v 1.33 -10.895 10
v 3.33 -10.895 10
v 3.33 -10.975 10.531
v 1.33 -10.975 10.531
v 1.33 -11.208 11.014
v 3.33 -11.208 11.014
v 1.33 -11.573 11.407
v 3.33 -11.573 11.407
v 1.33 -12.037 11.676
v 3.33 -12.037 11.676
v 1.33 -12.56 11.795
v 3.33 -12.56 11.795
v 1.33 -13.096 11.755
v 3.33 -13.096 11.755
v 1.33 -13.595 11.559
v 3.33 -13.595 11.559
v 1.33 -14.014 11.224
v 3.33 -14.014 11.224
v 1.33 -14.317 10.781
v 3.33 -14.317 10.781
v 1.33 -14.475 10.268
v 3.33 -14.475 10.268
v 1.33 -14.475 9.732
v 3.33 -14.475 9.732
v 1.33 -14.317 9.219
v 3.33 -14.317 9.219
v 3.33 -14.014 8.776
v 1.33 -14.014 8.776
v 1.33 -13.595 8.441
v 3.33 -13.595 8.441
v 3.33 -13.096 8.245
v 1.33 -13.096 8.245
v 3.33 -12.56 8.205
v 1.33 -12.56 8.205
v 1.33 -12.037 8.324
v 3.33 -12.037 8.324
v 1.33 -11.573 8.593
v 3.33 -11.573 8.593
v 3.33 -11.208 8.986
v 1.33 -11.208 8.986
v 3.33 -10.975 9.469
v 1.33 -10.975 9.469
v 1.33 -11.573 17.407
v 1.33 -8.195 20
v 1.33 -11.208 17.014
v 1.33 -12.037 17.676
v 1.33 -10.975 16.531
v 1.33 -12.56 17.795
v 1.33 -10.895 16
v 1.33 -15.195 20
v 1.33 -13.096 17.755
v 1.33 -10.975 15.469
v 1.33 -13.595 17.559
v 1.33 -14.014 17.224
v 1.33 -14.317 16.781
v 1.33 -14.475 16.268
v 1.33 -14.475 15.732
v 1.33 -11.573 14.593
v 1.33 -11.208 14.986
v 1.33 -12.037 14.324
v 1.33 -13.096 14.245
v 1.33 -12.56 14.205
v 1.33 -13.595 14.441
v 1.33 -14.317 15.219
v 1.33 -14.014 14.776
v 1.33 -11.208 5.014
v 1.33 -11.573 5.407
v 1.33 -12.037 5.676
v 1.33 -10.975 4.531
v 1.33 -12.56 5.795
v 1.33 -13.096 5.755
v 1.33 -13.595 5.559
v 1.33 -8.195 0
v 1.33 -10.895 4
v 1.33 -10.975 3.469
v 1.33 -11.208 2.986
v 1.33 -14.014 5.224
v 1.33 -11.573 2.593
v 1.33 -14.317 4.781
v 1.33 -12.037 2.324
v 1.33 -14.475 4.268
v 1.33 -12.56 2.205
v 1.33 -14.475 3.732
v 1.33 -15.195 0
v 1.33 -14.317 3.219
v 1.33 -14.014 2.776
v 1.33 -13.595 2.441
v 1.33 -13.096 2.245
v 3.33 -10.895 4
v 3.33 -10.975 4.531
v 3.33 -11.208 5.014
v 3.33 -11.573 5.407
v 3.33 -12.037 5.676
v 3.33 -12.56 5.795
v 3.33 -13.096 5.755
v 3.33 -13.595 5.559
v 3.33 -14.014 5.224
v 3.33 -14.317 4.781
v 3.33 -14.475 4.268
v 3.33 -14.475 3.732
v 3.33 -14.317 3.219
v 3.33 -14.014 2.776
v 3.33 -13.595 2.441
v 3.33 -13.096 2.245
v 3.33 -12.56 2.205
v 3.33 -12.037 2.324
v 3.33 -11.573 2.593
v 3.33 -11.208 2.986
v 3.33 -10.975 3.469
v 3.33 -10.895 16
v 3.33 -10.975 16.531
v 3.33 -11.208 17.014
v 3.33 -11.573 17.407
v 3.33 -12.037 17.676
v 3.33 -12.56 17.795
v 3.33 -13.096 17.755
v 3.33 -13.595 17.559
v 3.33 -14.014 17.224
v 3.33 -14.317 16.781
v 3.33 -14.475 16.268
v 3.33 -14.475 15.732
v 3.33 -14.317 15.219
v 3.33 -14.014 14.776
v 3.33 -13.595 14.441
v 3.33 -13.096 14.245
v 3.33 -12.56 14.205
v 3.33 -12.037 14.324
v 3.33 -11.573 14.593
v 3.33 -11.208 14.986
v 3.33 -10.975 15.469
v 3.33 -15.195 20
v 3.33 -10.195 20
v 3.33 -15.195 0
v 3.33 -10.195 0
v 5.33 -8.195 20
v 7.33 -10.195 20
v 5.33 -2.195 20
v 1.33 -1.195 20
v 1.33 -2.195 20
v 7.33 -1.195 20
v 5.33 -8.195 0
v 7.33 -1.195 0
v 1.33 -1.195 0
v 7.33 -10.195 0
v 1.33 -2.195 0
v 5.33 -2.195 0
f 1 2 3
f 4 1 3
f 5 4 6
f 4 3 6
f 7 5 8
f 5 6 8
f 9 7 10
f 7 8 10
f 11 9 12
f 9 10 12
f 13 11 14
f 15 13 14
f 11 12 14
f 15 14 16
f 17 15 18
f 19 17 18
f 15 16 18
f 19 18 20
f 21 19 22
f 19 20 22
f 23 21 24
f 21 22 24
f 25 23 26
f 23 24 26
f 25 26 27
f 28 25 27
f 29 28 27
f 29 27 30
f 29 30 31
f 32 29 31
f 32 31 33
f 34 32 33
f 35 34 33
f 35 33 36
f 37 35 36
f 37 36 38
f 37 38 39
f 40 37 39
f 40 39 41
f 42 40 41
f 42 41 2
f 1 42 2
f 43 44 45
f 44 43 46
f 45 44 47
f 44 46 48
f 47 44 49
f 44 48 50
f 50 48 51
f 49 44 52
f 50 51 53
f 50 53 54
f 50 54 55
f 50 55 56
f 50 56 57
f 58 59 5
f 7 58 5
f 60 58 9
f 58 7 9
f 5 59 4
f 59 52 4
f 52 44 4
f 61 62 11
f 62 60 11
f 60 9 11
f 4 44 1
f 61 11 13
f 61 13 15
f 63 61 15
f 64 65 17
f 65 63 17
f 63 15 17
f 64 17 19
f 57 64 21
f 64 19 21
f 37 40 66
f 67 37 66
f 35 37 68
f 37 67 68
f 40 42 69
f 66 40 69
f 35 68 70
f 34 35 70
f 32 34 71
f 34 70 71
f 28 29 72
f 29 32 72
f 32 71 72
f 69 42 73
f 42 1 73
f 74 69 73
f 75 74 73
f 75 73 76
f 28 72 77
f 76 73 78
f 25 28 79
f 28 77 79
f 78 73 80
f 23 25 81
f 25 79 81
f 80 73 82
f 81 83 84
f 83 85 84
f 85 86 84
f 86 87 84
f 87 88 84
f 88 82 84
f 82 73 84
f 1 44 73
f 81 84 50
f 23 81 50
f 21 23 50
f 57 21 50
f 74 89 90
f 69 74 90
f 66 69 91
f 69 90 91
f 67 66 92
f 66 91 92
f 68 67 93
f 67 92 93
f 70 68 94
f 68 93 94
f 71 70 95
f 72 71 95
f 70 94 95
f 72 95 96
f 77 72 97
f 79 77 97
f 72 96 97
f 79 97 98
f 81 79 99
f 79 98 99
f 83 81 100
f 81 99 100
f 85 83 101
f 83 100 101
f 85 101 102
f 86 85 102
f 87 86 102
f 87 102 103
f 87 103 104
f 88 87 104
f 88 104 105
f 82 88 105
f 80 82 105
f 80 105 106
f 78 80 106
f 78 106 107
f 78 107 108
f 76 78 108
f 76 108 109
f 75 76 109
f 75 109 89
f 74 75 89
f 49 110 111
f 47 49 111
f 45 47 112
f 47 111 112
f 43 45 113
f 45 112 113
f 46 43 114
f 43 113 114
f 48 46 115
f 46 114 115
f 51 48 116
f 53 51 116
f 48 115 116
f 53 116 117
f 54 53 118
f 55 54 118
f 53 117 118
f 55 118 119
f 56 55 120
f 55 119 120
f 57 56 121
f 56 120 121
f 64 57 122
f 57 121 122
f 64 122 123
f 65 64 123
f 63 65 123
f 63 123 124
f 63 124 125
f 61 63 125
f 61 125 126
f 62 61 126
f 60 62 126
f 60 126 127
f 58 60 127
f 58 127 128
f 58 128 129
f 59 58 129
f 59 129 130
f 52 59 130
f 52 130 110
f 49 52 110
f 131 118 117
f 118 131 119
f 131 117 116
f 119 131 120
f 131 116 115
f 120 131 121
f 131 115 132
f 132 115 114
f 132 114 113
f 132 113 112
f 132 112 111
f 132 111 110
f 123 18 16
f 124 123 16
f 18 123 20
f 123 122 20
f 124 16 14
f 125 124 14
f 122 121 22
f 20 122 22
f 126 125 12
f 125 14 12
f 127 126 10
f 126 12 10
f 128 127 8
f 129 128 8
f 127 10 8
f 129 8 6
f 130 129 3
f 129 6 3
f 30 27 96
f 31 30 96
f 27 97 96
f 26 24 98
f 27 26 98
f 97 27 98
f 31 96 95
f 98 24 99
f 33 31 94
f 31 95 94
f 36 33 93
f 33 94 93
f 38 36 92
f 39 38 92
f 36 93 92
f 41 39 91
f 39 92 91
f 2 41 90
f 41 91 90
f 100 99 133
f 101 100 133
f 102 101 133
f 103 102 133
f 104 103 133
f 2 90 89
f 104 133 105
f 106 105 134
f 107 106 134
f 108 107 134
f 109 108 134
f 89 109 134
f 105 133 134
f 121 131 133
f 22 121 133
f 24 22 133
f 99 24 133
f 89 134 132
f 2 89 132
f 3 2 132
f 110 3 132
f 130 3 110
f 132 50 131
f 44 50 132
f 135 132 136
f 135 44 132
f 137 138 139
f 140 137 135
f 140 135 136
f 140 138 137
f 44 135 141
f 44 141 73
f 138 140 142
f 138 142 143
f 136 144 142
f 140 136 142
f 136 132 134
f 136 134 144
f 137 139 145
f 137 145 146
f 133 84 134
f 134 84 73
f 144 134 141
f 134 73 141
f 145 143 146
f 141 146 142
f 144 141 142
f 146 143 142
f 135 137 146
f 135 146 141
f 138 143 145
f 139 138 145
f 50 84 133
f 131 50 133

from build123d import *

# Parameters (mm, degrees)
F1_DEPTH = 20
F2_R     = 1.8
F3_DEPTH = 25


with BuildPart() as f1:
    # F0 (on Top) → F1 (new body)
    with BuildSketch(Plane.XY):
        Polygon((7.329645, -10.194992), (7.329645, -1.194992), (1.329645, -1.194992), (1.329645, -2.194992), (5.329645, -2.194992), (5.329645, -8.194992), (1.329645, -8.194992), (1.329645, -15.194992), (3.329645, -15.194992), (3.329645, -10.194992), align=None)
    extrude(amount=F1_DEPTH)

    # F2 (on face) → F3 (cut)
    with BuildSketch(Plane.YZ.offset(3.329645)):
        with Locations((-12.694992, 16)):
            Circle(F2_R)
        with Locations((-12.694992, 10)):
            Circle(F2_R)
        with Locations((-12.694992, 4)):
            Circle(F2_R)
    extrude(amount=-F3_DEPTH, mode=Mode.SUBTRACT)


solid = f1.part
